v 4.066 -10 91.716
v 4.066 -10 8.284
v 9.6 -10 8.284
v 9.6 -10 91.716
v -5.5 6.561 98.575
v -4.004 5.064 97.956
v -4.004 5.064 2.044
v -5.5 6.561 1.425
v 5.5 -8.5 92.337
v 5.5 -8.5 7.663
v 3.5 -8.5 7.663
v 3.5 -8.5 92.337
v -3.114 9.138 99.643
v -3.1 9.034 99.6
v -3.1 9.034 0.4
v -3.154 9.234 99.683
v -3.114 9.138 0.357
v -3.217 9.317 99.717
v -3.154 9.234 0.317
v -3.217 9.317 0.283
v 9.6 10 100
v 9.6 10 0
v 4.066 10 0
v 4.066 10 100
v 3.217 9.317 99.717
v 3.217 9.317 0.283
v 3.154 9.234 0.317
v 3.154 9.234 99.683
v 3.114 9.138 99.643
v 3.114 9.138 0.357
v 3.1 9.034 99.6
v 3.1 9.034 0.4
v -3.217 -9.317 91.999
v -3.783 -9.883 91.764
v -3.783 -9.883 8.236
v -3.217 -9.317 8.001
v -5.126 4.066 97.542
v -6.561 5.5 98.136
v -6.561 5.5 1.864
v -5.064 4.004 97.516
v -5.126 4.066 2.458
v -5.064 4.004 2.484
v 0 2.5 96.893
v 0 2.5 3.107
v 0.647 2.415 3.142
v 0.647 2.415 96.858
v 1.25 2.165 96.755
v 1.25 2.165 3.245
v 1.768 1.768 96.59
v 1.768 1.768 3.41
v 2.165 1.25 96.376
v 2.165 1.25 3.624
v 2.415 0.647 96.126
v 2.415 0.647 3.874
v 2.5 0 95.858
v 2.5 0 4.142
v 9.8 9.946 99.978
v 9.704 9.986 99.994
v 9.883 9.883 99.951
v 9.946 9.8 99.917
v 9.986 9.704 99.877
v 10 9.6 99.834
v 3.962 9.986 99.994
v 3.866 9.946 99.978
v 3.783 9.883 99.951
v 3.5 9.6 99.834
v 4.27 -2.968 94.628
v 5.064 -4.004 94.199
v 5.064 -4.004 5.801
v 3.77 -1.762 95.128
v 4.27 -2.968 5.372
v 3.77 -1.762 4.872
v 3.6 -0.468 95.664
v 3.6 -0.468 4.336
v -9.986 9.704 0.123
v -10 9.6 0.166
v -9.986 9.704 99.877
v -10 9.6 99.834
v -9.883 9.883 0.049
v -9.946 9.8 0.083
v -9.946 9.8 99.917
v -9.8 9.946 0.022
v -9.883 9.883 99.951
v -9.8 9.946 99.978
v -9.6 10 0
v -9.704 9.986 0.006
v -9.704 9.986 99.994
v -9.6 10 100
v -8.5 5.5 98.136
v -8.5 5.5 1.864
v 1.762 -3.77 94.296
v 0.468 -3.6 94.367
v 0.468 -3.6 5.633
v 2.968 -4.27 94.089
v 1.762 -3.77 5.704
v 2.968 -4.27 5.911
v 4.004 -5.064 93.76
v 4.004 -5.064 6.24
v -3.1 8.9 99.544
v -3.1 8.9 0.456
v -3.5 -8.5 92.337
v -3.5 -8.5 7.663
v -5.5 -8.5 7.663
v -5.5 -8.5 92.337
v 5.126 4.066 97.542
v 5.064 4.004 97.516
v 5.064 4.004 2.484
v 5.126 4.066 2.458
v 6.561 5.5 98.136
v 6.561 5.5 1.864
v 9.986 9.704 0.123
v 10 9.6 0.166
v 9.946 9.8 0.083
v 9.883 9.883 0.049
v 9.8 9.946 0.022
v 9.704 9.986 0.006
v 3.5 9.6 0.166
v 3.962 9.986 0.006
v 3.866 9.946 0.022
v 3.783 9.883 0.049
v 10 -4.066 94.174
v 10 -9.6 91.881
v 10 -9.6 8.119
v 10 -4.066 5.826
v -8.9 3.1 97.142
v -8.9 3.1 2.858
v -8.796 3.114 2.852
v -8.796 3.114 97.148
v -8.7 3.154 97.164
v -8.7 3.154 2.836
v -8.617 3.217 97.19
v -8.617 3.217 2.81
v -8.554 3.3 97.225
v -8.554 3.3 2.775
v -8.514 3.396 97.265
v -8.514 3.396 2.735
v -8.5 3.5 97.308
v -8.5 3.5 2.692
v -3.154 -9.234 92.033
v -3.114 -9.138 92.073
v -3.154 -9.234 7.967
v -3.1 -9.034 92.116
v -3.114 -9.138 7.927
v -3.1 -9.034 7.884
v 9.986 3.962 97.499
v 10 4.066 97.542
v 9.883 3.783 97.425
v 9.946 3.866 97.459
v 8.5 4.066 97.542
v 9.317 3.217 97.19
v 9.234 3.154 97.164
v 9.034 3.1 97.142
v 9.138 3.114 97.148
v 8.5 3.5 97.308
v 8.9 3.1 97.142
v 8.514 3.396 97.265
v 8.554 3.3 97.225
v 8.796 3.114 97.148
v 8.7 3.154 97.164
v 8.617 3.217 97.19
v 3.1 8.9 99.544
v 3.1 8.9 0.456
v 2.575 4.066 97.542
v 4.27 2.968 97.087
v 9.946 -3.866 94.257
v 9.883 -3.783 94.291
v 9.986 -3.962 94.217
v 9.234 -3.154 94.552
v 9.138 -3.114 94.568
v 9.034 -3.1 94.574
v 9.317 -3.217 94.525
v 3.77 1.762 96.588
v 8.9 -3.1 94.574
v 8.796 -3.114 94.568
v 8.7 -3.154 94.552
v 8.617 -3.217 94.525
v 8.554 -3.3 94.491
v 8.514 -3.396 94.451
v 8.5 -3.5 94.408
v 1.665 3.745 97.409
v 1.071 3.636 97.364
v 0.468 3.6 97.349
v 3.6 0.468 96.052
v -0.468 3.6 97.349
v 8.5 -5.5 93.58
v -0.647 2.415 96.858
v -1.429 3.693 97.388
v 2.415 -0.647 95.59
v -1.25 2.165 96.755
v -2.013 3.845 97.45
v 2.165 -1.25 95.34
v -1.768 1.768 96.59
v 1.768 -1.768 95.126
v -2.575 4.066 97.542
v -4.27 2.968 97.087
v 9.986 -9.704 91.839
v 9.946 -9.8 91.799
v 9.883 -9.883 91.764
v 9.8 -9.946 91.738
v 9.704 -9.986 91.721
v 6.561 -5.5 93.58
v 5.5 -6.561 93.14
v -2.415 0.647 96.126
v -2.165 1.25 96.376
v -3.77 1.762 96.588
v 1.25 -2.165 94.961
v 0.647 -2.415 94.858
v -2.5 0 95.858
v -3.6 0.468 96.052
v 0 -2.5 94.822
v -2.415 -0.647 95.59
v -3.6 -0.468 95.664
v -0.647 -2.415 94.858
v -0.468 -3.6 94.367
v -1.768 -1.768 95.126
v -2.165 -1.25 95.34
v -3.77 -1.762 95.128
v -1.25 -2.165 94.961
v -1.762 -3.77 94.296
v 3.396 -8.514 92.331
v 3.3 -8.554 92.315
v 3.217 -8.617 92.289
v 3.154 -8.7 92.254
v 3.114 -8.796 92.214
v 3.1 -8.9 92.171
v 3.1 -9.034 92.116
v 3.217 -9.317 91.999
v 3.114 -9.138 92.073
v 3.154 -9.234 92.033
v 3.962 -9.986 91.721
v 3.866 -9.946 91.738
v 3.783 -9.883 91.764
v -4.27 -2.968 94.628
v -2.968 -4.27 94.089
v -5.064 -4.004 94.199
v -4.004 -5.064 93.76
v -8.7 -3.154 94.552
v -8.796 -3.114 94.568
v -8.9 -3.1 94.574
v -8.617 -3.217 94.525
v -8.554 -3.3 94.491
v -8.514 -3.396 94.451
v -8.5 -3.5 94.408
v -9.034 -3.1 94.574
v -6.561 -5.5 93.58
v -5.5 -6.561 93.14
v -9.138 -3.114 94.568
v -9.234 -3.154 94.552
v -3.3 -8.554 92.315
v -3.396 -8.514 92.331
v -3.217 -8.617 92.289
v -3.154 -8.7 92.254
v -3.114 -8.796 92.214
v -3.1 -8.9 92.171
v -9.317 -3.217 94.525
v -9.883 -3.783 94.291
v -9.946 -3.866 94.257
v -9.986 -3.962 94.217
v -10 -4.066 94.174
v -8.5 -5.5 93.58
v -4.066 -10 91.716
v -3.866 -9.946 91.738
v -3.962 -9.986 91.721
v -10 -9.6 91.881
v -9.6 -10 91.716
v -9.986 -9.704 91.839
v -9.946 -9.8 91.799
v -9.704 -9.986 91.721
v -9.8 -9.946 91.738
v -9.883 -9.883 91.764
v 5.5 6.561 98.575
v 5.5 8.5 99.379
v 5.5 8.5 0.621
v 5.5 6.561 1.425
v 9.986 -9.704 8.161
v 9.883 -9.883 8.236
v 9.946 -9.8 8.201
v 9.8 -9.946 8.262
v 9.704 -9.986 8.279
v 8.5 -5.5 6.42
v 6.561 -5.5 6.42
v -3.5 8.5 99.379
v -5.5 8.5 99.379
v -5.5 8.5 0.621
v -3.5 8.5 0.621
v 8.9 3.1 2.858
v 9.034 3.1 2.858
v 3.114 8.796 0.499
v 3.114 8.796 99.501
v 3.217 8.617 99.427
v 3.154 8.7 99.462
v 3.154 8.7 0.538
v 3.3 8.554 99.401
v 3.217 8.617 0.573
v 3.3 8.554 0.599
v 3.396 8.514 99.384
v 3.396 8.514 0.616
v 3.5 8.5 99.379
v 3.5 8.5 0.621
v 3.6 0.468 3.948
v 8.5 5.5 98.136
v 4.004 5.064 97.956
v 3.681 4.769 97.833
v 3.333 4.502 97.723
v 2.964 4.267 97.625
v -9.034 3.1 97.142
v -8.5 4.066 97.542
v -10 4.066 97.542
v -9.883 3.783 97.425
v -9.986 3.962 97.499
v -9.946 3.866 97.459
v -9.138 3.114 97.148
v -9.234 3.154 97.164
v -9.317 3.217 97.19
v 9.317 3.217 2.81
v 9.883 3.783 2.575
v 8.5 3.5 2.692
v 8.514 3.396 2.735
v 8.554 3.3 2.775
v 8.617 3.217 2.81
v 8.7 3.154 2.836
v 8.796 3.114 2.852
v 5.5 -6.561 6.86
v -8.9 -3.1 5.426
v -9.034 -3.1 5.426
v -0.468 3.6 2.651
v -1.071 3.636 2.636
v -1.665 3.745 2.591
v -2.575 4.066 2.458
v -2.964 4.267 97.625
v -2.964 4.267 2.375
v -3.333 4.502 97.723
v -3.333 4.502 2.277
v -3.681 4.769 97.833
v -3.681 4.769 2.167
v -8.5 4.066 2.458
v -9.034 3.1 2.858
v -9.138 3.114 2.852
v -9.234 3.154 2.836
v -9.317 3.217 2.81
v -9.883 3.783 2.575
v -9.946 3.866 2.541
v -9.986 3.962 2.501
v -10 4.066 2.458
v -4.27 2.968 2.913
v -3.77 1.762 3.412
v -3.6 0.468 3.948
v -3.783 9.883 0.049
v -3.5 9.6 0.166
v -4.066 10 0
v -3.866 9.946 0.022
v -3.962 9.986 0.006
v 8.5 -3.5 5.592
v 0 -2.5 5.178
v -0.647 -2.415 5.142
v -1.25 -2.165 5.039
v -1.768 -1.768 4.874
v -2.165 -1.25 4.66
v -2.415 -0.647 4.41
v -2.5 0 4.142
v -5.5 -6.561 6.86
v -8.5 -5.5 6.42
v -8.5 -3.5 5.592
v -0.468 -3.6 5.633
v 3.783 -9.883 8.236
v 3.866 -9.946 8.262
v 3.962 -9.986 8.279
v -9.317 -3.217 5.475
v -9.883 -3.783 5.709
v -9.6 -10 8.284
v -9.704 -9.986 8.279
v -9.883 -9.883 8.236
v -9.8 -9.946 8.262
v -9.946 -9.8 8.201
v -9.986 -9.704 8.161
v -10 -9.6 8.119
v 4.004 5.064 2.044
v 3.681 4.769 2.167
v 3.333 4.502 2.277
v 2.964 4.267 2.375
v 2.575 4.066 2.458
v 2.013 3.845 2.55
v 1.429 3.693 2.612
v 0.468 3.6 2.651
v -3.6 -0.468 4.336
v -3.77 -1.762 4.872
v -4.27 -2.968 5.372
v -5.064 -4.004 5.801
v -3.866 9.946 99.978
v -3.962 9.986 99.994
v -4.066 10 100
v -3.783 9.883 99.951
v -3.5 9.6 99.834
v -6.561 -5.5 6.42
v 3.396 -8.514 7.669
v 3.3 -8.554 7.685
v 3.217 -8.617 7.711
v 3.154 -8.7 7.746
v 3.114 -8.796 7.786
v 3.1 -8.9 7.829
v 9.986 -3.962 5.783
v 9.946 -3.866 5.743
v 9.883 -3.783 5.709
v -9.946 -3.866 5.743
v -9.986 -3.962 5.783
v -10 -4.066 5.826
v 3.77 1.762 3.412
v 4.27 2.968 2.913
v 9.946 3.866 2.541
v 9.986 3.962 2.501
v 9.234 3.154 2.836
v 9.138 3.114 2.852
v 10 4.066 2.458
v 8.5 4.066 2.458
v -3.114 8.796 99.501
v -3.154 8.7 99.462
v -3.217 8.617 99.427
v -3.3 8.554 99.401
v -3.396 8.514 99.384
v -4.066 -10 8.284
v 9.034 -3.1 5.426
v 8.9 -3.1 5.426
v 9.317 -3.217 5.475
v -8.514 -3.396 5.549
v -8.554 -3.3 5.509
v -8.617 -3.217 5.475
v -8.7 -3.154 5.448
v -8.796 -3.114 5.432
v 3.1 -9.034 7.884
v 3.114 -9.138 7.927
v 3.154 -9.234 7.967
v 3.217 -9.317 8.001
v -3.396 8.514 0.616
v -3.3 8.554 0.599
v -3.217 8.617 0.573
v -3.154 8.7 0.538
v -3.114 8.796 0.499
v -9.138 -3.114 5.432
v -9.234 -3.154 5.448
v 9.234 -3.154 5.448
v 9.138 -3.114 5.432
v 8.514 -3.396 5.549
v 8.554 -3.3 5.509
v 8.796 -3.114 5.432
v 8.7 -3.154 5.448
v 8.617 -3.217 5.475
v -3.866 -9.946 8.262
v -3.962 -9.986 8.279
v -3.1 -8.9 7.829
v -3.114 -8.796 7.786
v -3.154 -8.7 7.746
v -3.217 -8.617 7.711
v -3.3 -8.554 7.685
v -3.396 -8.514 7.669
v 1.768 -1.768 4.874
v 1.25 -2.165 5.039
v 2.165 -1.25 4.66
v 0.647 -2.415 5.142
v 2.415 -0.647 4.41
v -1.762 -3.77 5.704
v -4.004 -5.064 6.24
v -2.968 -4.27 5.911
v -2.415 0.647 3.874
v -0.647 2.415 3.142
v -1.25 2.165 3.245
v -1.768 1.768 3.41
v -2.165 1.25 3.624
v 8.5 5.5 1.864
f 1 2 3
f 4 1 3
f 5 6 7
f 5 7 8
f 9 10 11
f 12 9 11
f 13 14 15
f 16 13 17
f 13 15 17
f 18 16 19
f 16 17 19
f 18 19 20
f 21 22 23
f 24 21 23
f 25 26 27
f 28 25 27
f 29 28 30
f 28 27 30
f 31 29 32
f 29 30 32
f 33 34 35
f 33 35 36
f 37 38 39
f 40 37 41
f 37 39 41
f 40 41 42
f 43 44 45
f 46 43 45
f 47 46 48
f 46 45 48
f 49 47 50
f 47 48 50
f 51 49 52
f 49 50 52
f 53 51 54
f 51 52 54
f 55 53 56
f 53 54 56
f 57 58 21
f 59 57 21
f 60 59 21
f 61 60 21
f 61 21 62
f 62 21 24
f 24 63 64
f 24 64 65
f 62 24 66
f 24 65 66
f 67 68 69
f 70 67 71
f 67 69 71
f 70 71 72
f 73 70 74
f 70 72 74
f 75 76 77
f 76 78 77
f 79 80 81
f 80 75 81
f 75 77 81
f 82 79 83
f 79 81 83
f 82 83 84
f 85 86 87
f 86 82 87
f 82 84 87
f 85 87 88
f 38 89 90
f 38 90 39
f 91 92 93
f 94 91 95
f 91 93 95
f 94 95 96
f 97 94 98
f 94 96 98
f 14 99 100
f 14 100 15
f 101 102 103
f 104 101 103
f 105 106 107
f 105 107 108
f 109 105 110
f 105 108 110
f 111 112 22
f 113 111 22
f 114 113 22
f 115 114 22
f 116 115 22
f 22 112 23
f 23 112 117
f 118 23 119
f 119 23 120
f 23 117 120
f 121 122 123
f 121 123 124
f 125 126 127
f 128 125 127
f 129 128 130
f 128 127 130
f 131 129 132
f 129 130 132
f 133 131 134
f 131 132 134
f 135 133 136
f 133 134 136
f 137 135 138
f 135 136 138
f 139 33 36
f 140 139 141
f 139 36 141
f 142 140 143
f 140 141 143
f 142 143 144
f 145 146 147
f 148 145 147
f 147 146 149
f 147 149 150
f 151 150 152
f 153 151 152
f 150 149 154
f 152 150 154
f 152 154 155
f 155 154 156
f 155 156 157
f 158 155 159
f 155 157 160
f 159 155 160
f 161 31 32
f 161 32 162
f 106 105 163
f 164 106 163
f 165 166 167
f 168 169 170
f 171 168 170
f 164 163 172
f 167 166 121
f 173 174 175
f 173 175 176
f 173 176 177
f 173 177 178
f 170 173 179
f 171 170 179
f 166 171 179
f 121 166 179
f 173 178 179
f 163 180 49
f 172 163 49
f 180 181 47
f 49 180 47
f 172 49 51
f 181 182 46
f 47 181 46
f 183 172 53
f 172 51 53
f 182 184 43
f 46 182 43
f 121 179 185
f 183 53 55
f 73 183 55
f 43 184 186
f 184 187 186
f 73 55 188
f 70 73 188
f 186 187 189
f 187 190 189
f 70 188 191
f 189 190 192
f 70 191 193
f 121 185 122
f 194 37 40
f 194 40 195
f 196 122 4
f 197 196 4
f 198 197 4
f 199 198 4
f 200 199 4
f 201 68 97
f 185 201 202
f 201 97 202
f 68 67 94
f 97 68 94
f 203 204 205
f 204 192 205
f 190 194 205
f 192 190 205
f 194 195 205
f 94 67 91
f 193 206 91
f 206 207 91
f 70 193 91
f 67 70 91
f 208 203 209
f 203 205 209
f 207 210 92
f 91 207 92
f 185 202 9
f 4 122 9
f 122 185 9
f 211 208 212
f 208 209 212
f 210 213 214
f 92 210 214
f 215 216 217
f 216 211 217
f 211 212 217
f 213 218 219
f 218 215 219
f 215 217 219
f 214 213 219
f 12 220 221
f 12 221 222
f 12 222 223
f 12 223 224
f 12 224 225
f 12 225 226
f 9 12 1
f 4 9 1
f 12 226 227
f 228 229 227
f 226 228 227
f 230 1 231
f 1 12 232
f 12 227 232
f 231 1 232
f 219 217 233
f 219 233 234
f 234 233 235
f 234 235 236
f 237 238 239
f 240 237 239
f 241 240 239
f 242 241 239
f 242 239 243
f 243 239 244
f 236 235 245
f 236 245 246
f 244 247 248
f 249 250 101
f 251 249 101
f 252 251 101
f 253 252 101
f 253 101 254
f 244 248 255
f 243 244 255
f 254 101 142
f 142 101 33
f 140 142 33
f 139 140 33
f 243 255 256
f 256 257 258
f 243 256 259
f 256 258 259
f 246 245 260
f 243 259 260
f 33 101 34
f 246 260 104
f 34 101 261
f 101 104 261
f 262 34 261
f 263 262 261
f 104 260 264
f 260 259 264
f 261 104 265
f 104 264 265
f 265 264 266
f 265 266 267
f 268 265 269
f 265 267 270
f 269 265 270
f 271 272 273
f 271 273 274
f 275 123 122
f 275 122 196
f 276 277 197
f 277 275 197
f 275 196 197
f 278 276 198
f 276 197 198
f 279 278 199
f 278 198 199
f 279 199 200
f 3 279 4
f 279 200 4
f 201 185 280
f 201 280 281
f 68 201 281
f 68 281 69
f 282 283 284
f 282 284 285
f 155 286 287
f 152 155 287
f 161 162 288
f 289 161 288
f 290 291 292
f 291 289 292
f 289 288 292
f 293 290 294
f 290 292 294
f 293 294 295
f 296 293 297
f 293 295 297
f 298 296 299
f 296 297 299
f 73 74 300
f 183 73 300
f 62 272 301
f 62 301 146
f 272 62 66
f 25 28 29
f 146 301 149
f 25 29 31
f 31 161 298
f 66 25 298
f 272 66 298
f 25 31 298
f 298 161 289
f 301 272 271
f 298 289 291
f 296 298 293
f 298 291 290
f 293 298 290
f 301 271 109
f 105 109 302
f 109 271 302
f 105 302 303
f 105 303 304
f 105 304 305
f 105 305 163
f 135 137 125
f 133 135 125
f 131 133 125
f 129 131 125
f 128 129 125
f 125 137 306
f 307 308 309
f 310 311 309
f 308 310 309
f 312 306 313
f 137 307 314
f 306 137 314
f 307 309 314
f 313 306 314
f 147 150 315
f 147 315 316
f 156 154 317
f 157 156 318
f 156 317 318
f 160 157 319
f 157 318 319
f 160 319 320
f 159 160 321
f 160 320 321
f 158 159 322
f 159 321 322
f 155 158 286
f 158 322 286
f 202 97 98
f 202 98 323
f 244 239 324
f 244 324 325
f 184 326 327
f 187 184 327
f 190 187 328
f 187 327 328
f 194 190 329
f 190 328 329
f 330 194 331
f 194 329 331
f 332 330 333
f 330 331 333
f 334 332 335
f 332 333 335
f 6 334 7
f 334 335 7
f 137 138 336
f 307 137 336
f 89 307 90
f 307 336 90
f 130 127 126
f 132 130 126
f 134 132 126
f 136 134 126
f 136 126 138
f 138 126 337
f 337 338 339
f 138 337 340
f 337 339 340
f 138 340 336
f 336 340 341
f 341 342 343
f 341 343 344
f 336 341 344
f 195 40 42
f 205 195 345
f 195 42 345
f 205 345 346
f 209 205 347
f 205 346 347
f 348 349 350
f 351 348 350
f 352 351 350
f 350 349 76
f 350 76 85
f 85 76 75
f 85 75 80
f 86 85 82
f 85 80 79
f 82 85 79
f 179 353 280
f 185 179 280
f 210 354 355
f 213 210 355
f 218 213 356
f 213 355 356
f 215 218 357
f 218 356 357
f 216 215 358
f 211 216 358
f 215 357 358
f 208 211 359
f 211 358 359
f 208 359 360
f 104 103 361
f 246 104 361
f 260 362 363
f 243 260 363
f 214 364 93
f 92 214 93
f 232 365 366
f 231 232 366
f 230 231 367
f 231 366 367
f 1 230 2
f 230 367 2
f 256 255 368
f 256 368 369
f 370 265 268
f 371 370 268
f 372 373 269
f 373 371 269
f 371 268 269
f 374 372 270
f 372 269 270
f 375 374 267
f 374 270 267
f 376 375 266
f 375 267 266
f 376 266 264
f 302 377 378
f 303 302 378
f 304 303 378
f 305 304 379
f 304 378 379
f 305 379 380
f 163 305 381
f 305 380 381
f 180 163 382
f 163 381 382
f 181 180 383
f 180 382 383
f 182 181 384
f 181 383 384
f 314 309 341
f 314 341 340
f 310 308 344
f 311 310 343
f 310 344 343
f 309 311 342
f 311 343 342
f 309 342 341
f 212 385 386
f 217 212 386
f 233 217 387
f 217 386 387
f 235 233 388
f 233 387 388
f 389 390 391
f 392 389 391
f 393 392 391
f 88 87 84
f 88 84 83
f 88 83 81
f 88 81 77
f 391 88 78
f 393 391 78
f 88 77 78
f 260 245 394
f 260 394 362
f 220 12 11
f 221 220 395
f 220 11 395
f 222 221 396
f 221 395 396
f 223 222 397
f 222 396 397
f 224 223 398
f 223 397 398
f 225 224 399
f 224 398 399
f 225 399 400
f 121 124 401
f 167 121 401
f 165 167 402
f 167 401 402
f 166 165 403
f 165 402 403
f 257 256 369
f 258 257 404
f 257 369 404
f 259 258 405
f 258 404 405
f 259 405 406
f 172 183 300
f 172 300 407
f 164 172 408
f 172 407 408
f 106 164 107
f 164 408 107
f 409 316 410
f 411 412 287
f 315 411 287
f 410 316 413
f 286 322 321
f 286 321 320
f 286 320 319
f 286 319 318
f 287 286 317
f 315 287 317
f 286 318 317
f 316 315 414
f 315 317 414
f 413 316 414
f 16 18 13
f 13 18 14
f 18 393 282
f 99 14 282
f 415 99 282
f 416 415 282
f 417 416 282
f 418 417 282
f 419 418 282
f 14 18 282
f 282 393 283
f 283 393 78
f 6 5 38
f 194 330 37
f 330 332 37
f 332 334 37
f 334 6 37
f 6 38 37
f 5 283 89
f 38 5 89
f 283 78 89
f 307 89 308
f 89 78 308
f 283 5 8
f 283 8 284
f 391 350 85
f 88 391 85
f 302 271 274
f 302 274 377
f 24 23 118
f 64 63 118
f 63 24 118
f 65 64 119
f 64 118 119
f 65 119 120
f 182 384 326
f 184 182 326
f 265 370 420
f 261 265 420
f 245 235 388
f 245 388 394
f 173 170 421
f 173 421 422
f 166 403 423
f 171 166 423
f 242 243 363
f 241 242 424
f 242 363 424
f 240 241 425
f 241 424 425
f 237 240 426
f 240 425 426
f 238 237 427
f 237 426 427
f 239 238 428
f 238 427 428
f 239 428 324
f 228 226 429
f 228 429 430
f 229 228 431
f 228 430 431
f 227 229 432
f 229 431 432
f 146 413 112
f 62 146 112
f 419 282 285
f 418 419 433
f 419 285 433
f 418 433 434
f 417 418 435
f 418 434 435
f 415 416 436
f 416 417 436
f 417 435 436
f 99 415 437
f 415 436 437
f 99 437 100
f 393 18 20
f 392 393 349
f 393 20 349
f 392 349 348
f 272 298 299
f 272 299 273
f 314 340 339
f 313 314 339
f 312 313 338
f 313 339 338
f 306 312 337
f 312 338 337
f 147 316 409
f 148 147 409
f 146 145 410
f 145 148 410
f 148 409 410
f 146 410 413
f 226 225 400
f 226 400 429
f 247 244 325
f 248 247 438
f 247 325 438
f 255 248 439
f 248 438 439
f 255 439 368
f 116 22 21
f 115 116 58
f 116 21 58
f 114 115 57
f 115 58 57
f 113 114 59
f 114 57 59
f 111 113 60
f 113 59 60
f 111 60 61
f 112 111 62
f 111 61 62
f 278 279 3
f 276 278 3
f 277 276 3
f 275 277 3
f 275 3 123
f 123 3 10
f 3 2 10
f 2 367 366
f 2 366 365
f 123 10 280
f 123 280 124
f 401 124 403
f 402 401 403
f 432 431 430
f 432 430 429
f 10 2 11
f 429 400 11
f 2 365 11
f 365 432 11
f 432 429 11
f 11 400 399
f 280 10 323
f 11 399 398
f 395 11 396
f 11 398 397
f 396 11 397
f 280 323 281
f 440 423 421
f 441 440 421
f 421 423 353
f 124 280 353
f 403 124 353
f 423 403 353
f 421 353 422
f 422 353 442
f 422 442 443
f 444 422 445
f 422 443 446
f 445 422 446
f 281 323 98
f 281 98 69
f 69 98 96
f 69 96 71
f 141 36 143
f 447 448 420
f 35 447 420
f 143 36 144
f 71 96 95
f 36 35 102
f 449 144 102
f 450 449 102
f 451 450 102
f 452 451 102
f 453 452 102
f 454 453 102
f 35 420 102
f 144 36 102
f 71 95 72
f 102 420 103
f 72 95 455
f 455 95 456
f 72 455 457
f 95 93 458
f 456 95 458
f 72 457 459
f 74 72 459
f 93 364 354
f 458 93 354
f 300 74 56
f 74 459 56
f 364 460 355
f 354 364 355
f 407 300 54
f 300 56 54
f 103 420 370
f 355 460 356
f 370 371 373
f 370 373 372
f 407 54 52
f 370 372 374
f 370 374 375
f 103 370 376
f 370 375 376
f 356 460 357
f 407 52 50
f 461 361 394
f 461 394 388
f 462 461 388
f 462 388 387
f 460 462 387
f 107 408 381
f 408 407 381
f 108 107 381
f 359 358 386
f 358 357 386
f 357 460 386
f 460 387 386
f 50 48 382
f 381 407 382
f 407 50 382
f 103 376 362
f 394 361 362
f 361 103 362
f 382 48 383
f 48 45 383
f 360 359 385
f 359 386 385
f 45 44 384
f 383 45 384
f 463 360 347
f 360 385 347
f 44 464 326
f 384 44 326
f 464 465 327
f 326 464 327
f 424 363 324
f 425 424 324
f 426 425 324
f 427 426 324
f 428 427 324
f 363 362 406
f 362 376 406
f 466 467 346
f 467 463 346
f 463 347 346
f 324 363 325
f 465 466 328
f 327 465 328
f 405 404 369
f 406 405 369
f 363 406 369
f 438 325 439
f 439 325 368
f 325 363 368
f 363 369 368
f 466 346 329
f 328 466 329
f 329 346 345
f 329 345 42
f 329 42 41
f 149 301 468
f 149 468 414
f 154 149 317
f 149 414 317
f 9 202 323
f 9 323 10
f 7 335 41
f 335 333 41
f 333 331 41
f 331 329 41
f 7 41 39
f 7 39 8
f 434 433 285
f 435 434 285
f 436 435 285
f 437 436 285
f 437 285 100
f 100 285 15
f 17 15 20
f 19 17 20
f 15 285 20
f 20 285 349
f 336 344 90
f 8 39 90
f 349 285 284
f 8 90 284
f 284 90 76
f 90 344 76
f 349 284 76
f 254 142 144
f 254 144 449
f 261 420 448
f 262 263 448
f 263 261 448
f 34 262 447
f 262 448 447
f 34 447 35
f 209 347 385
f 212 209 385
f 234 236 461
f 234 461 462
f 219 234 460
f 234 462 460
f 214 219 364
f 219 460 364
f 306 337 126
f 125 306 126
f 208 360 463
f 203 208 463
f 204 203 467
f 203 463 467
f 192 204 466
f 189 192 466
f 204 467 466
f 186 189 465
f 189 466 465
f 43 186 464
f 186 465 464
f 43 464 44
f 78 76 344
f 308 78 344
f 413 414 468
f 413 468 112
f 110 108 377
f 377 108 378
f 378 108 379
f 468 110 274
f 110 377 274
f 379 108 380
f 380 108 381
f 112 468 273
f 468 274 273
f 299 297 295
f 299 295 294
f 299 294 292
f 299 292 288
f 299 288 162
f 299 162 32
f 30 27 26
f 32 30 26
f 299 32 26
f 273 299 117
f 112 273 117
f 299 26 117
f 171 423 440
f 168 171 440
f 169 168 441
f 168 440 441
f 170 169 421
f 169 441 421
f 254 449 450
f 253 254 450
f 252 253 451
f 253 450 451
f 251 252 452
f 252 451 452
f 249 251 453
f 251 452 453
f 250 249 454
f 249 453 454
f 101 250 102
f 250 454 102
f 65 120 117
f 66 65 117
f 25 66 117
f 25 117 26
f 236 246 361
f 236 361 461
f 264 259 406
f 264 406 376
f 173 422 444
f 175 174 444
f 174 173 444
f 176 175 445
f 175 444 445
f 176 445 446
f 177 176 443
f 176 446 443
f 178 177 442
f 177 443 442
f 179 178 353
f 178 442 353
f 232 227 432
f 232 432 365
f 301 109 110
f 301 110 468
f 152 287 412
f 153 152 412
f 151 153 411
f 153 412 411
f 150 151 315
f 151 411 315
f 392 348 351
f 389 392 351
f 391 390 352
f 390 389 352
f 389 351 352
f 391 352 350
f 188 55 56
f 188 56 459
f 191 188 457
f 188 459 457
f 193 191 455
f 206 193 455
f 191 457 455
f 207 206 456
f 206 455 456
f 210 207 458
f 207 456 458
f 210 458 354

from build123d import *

# Parameters (mm, degrees)
RESSALTO_EXTRUS_O1_DEPTH = 100
PADR_OCIRCULAR1_COUNT    = 4
FILETE1_R                = 0.4
CUT_EXTRUDE1_DEPTH       = 103.46950766


with BuildPart() as part:
    # Esboço1 → Ressalto-extrusão1 (new body)
    with BuildSketch(Plane.XY):
        with BuildLine():
            ThreePointArc((-9.317157288, 3.217157288), (-9.187387948, 3.130448187), (-9.034314575, 3.1))
            Line((-9.034314575, 3.1), (-8.9, 3.1))
            ThreePointArc((-8.9, 3.1), (-8.617157288, 3.217157288), (-8.5, 3.5))
            Line((-8.5, 3.5), (-8.5, 5.5))
            Line((-8.5, 5.5), (-6.560660172, 5.5))
            Line((-6.560660172, 5.5), (-5.064466094, 4.003805922))
            ThreePointArc((-5.064466094, 4.003805922), (-3.980602337, 2.381689178), (-3.6, 0.468272016))
            Line((-3.6, 0.468272016), (-3.6, 0))
            Line((-3.6, 0), (-2.5, 0))
            ThreePointArc((-2.5, 0), (-1.767766953, 1.767766953), (0, 2.5))
            Line((0, 2.5), (0, 3.6))
            Line((0, 3.6), (-0.468272016, 3.6))
            ThreePointArc((-0.468272016, 3.6), (-2.381689178, 3.980602337), (-4.003805922, 5.064466094))
            Line((-4.003805922, 5.064466094), (-5.5, 6.560660172))
            Line((-5.5, 6.560660172), (-5.5, 8.5))
            Line((-5.5, 8.5), (-3.5, 8.5))
            ThreePointArc((-3.5, 8.5), (-3.217157288, 8.617157288), (-3.1, 8.9))
            Line((-3.1, 8.9), (-3.1, 9.034314575))
            ThreePointArc((-3.1, 9.034314575), (-3.130448187, 9.187387948), (-3.217157288, 9.317157288))
            Line((-3.217157288, 9.317157288), (-3.782842712, 9.882842712))
            ThreePointArc((-3.782842712, 9.882842712), (-3.912612052, 9.969551813), (-4.065685425, 10))
            Line((-4.065685425, 10), (-10, 10))
            Line((-10, 10), (-10, 4.065685425))
            ThreePointArc((-10, 4.065685425), (-9.969551813, 3.912612052), (-9.882842712, 3.782842712))
            Line((-9.882842712, 3.782842712), (-9.317157288, 3.217157288))
        make_face()
    ressalto_extrus_o1 = extrude(amount=RESSALTO_EXTRUS_O1_DEPTH)

    # PadrãoCircular1: Ressalto-extrusão1 ×4 about axis
    padr_ocircular1_axis = Axis((0, 0, 0), (0, 0, 1))
    for i in range(1, PADR_OCIRCULAR1_COUNT):
        add(ressalto_extrus_o1.rotate(padr_ocircular1_axis, i * 360 / PADR_OCIRCULAR1_COUNT))

    # Filete1
    filete1_edges = [part.edges().sort_by_distance(p)[0] for p in [
        (10, -10, 50),
        (10, 10, 50),
        (-10, 10, 50),
        (-10, -10, 50),
    ]]
    fillet(filete1_edges, radius=FILETE1_R)

    # Sketch1 → Cut-Extrude1 (cut, through all)
    with BuildSketch(Plane.ZY.offset(10)):
        Polygon((2.45807358, 4.065685425), (0, 4.065685425), (0, -10), (8.284271247, -10), align=None)
        Polygon((0.165685425, 9.6), (0, 9.6), (0, 4.065685425), (2.45807358, 4.065685425), align=None)
        Polygon((100, 9.6), (99.834314575, 9.6), (97.54192642, 4.065685425), (100, 4.065685425), align=None)
        Polygon((100, 4.065685425), (97.54192642, 4.065685425), (91.715728753, -10), (100, -10), (100, -9.6), align=None)
        Polygon((100, 10), (99.834314575, 9.6), (100, 9.6), align=None)
        Polygon((0.165685425, 9.6), (0, 10), (0, 9.6), align=None)
    extrude(amount=-CUT_EXTRUDE1_DEPTH, mode=Mode.SUBTRACT)


solid = part.part
